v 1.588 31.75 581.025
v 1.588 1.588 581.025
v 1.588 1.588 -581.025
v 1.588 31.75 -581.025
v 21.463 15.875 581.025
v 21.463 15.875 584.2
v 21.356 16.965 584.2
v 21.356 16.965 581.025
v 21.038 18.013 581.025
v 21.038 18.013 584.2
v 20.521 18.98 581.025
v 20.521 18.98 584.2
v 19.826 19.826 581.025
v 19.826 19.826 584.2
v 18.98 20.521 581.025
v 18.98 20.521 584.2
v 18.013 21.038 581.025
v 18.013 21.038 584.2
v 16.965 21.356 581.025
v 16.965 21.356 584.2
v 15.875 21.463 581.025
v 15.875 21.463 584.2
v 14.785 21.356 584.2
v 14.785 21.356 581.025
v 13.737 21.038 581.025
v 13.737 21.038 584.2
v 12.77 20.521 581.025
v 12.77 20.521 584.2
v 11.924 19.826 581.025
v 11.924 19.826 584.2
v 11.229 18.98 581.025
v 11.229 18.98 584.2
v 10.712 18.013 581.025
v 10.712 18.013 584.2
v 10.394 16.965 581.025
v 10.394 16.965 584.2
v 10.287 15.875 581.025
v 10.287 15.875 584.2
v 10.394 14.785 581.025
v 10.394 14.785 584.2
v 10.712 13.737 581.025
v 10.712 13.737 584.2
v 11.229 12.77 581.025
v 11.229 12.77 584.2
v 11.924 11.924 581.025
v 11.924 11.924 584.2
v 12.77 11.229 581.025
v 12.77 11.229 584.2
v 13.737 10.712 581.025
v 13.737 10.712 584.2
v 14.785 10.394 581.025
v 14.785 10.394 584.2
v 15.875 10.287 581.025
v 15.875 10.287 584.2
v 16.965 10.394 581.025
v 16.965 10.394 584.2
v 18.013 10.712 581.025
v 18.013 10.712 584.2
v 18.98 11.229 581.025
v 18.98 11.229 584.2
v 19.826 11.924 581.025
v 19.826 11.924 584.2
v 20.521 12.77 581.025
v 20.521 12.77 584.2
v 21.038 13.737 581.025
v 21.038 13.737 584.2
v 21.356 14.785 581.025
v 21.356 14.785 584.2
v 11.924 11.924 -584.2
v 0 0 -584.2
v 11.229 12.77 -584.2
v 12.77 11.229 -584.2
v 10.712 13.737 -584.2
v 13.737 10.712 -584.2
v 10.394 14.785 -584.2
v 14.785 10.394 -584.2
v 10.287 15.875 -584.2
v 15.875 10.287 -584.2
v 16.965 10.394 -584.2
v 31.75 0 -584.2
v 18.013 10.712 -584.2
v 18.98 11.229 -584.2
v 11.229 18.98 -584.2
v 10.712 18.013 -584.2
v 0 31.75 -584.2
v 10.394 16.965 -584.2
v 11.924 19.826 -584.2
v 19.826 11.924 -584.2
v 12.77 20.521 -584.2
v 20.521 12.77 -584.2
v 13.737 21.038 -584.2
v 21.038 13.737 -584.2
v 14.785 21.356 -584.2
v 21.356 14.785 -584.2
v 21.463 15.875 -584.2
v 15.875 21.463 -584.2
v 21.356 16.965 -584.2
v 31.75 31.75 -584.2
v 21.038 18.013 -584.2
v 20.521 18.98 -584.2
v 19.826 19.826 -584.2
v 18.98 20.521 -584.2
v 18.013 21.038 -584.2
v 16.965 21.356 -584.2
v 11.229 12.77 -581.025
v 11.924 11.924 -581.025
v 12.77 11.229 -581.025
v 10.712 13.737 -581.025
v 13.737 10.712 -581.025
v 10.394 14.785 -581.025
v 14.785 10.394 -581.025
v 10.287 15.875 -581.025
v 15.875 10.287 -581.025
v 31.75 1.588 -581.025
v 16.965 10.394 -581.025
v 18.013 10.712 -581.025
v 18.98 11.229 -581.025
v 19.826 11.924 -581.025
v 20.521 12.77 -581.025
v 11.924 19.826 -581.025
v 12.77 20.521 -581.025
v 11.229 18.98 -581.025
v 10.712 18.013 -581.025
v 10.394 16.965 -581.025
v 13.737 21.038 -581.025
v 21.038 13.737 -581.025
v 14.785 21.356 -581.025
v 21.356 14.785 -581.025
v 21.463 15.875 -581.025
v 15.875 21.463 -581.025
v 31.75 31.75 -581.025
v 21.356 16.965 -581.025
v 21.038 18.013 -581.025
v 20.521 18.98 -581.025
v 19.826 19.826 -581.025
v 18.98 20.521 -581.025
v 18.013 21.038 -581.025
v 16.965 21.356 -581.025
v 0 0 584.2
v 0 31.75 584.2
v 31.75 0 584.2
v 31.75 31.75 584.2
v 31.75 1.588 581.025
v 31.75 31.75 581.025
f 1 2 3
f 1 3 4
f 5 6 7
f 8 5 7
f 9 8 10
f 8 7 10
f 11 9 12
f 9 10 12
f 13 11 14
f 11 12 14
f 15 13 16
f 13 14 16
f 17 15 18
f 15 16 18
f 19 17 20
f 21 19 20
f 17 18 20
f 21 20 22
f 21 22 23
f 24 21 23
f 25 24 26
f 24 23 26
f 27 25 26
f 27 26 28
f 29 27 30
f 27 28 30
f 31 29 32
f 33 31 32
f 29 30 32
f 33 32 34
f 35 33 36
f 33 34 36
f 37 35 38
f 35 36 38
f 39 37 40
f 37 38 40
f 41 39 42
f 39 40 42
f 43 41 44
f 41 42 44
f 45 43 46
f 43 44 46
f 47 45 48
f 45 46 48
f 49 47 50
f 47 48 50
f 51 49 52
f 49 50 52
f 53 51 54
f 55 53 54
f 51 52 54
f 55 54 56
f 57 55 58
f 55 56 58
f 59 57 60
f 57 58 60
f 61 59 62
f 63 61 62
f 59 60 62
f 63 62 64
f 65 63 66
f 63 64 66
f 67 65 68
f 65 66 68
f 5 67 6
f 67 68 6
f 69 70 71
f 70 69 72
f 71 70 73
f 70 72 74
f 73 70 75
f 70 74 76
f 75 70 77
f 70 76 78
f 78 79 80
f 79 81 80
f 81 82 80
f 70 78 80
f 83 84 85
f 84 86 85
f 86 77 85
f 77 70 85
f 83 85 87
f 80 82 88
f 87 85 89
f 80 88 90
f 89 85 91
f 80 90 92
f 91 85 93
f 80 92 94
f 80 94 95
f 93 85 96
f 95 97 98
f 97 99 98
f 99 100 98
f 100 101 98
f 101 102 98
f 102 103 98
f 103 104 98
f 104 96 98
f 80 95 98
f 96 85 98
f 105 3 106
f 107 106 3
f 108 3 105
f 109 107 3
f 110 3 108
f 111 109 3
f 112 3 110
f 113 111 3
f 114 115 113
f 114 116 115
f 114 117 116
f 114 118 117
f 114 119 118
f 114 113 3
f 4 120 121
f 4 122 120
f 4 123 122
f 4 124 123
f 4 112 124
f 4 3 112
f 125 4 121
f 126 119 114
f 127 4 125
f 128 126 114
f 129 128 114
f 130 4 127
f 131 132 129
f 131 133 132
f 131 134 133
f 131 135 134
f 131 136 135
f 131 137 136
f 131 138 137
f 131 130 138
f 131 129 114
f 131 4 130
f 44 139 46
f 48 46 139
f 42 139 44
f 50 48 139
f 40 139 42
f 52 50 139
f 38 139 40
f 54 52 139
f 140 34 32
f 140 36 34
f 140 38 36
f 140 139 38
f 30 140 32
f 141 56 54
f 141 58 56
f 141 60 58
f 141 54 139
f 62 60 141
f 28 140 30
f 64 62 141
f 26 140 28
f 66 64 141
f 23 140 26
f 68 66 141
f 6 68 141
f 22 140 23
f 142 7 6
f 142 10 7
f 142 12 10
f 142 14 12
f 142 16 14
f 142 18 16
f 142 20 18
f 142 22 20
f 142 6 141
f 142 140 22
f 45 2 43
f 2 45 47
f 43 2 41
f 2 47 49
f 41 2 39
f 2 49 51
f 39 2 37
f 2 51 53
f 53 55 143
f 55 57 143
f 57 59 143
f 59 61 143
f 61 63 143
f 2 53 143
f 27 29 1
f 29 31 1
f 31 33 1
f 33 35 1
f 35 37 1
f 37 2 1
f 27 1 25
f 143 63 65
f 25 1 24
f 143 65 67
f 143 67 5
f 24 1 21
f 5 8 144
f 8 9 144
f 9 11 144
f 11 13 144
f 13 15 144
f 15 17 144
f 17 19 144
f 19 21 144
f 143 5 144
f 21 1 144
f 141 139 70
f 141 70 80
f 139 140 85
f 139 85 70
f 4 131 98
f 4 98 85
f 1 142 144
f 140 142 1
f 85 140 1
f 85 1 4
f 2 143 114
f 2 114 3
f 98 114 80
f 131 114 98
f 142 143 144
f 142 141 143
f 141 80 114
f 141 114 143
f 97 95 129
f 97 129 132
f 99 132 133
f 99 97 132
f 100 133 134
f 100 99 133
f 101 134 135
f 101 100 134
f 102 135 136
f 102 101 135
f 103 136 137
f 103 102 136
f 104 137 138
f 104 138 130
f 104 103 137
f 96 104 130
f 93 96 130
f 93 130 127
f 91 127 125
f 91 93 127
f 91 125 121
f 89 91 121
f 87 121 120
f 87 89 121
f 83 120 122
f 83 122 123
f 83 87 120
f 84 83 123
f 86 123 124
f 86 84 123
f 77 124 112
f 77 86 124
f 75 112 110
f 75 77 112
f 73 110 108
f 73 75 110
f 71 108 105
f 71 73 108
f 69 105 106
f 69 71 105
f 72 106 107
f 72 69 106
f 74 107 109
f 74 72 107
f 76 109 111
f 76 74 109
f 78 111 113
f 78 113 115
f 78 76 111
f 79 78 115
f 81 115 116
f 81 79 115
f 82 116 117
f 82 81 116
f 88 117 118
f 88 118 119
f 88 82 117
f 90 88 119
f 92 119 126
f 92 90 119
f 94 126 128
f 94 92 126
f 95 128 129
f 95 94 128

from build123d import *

# Parameters (mm, degrees)
BOSS_EXTRUDE1_DEPTH = 584.2
BOSS_EXTRUDE2_START = 584.2
SKETCH2_W           = 31.75
SKETCH2_H           = 31.75
SKETCH2_R           = 5.588
BOSS_EXTRUDE2_DEPTH = 3.175


with BuildPart() as part:
    # Sketch1 → Boss-Extrude1 (new, symmetric)
    with BuildSketch(Plane.XY):
        Polygon((31.75, 1.5875), (1.5875, 1.5875), (1.5875, 31.75), (0, 31.75), (0, 0), (31.75, 0), align=None)
    extrude(amount=BOSS_EXTRUDE1_DEPTH, both=True)

    # Sketch2 → Boss-Extrude2 (add)
    with BuildSketch(Plane.XY.offset(BOSS_EXTRUDE2_START)):
        with Locations((15.875, 15.875)):
            Rectangle(SKETCH2_W, SKETCH2_H)
        with Locations((15.875, 15.875)):
            Circle(SKETCH2_R, mode=Mode.SUBTRACT)
    boss_extrude2 = extrude(amount=-BOSS_EXTRUDE2_DEPTH)

    # Mirror1: Boss-Extrude2 across plane
    add(boss_extrude2.mirror(Plane.XY))


solid = part.part
